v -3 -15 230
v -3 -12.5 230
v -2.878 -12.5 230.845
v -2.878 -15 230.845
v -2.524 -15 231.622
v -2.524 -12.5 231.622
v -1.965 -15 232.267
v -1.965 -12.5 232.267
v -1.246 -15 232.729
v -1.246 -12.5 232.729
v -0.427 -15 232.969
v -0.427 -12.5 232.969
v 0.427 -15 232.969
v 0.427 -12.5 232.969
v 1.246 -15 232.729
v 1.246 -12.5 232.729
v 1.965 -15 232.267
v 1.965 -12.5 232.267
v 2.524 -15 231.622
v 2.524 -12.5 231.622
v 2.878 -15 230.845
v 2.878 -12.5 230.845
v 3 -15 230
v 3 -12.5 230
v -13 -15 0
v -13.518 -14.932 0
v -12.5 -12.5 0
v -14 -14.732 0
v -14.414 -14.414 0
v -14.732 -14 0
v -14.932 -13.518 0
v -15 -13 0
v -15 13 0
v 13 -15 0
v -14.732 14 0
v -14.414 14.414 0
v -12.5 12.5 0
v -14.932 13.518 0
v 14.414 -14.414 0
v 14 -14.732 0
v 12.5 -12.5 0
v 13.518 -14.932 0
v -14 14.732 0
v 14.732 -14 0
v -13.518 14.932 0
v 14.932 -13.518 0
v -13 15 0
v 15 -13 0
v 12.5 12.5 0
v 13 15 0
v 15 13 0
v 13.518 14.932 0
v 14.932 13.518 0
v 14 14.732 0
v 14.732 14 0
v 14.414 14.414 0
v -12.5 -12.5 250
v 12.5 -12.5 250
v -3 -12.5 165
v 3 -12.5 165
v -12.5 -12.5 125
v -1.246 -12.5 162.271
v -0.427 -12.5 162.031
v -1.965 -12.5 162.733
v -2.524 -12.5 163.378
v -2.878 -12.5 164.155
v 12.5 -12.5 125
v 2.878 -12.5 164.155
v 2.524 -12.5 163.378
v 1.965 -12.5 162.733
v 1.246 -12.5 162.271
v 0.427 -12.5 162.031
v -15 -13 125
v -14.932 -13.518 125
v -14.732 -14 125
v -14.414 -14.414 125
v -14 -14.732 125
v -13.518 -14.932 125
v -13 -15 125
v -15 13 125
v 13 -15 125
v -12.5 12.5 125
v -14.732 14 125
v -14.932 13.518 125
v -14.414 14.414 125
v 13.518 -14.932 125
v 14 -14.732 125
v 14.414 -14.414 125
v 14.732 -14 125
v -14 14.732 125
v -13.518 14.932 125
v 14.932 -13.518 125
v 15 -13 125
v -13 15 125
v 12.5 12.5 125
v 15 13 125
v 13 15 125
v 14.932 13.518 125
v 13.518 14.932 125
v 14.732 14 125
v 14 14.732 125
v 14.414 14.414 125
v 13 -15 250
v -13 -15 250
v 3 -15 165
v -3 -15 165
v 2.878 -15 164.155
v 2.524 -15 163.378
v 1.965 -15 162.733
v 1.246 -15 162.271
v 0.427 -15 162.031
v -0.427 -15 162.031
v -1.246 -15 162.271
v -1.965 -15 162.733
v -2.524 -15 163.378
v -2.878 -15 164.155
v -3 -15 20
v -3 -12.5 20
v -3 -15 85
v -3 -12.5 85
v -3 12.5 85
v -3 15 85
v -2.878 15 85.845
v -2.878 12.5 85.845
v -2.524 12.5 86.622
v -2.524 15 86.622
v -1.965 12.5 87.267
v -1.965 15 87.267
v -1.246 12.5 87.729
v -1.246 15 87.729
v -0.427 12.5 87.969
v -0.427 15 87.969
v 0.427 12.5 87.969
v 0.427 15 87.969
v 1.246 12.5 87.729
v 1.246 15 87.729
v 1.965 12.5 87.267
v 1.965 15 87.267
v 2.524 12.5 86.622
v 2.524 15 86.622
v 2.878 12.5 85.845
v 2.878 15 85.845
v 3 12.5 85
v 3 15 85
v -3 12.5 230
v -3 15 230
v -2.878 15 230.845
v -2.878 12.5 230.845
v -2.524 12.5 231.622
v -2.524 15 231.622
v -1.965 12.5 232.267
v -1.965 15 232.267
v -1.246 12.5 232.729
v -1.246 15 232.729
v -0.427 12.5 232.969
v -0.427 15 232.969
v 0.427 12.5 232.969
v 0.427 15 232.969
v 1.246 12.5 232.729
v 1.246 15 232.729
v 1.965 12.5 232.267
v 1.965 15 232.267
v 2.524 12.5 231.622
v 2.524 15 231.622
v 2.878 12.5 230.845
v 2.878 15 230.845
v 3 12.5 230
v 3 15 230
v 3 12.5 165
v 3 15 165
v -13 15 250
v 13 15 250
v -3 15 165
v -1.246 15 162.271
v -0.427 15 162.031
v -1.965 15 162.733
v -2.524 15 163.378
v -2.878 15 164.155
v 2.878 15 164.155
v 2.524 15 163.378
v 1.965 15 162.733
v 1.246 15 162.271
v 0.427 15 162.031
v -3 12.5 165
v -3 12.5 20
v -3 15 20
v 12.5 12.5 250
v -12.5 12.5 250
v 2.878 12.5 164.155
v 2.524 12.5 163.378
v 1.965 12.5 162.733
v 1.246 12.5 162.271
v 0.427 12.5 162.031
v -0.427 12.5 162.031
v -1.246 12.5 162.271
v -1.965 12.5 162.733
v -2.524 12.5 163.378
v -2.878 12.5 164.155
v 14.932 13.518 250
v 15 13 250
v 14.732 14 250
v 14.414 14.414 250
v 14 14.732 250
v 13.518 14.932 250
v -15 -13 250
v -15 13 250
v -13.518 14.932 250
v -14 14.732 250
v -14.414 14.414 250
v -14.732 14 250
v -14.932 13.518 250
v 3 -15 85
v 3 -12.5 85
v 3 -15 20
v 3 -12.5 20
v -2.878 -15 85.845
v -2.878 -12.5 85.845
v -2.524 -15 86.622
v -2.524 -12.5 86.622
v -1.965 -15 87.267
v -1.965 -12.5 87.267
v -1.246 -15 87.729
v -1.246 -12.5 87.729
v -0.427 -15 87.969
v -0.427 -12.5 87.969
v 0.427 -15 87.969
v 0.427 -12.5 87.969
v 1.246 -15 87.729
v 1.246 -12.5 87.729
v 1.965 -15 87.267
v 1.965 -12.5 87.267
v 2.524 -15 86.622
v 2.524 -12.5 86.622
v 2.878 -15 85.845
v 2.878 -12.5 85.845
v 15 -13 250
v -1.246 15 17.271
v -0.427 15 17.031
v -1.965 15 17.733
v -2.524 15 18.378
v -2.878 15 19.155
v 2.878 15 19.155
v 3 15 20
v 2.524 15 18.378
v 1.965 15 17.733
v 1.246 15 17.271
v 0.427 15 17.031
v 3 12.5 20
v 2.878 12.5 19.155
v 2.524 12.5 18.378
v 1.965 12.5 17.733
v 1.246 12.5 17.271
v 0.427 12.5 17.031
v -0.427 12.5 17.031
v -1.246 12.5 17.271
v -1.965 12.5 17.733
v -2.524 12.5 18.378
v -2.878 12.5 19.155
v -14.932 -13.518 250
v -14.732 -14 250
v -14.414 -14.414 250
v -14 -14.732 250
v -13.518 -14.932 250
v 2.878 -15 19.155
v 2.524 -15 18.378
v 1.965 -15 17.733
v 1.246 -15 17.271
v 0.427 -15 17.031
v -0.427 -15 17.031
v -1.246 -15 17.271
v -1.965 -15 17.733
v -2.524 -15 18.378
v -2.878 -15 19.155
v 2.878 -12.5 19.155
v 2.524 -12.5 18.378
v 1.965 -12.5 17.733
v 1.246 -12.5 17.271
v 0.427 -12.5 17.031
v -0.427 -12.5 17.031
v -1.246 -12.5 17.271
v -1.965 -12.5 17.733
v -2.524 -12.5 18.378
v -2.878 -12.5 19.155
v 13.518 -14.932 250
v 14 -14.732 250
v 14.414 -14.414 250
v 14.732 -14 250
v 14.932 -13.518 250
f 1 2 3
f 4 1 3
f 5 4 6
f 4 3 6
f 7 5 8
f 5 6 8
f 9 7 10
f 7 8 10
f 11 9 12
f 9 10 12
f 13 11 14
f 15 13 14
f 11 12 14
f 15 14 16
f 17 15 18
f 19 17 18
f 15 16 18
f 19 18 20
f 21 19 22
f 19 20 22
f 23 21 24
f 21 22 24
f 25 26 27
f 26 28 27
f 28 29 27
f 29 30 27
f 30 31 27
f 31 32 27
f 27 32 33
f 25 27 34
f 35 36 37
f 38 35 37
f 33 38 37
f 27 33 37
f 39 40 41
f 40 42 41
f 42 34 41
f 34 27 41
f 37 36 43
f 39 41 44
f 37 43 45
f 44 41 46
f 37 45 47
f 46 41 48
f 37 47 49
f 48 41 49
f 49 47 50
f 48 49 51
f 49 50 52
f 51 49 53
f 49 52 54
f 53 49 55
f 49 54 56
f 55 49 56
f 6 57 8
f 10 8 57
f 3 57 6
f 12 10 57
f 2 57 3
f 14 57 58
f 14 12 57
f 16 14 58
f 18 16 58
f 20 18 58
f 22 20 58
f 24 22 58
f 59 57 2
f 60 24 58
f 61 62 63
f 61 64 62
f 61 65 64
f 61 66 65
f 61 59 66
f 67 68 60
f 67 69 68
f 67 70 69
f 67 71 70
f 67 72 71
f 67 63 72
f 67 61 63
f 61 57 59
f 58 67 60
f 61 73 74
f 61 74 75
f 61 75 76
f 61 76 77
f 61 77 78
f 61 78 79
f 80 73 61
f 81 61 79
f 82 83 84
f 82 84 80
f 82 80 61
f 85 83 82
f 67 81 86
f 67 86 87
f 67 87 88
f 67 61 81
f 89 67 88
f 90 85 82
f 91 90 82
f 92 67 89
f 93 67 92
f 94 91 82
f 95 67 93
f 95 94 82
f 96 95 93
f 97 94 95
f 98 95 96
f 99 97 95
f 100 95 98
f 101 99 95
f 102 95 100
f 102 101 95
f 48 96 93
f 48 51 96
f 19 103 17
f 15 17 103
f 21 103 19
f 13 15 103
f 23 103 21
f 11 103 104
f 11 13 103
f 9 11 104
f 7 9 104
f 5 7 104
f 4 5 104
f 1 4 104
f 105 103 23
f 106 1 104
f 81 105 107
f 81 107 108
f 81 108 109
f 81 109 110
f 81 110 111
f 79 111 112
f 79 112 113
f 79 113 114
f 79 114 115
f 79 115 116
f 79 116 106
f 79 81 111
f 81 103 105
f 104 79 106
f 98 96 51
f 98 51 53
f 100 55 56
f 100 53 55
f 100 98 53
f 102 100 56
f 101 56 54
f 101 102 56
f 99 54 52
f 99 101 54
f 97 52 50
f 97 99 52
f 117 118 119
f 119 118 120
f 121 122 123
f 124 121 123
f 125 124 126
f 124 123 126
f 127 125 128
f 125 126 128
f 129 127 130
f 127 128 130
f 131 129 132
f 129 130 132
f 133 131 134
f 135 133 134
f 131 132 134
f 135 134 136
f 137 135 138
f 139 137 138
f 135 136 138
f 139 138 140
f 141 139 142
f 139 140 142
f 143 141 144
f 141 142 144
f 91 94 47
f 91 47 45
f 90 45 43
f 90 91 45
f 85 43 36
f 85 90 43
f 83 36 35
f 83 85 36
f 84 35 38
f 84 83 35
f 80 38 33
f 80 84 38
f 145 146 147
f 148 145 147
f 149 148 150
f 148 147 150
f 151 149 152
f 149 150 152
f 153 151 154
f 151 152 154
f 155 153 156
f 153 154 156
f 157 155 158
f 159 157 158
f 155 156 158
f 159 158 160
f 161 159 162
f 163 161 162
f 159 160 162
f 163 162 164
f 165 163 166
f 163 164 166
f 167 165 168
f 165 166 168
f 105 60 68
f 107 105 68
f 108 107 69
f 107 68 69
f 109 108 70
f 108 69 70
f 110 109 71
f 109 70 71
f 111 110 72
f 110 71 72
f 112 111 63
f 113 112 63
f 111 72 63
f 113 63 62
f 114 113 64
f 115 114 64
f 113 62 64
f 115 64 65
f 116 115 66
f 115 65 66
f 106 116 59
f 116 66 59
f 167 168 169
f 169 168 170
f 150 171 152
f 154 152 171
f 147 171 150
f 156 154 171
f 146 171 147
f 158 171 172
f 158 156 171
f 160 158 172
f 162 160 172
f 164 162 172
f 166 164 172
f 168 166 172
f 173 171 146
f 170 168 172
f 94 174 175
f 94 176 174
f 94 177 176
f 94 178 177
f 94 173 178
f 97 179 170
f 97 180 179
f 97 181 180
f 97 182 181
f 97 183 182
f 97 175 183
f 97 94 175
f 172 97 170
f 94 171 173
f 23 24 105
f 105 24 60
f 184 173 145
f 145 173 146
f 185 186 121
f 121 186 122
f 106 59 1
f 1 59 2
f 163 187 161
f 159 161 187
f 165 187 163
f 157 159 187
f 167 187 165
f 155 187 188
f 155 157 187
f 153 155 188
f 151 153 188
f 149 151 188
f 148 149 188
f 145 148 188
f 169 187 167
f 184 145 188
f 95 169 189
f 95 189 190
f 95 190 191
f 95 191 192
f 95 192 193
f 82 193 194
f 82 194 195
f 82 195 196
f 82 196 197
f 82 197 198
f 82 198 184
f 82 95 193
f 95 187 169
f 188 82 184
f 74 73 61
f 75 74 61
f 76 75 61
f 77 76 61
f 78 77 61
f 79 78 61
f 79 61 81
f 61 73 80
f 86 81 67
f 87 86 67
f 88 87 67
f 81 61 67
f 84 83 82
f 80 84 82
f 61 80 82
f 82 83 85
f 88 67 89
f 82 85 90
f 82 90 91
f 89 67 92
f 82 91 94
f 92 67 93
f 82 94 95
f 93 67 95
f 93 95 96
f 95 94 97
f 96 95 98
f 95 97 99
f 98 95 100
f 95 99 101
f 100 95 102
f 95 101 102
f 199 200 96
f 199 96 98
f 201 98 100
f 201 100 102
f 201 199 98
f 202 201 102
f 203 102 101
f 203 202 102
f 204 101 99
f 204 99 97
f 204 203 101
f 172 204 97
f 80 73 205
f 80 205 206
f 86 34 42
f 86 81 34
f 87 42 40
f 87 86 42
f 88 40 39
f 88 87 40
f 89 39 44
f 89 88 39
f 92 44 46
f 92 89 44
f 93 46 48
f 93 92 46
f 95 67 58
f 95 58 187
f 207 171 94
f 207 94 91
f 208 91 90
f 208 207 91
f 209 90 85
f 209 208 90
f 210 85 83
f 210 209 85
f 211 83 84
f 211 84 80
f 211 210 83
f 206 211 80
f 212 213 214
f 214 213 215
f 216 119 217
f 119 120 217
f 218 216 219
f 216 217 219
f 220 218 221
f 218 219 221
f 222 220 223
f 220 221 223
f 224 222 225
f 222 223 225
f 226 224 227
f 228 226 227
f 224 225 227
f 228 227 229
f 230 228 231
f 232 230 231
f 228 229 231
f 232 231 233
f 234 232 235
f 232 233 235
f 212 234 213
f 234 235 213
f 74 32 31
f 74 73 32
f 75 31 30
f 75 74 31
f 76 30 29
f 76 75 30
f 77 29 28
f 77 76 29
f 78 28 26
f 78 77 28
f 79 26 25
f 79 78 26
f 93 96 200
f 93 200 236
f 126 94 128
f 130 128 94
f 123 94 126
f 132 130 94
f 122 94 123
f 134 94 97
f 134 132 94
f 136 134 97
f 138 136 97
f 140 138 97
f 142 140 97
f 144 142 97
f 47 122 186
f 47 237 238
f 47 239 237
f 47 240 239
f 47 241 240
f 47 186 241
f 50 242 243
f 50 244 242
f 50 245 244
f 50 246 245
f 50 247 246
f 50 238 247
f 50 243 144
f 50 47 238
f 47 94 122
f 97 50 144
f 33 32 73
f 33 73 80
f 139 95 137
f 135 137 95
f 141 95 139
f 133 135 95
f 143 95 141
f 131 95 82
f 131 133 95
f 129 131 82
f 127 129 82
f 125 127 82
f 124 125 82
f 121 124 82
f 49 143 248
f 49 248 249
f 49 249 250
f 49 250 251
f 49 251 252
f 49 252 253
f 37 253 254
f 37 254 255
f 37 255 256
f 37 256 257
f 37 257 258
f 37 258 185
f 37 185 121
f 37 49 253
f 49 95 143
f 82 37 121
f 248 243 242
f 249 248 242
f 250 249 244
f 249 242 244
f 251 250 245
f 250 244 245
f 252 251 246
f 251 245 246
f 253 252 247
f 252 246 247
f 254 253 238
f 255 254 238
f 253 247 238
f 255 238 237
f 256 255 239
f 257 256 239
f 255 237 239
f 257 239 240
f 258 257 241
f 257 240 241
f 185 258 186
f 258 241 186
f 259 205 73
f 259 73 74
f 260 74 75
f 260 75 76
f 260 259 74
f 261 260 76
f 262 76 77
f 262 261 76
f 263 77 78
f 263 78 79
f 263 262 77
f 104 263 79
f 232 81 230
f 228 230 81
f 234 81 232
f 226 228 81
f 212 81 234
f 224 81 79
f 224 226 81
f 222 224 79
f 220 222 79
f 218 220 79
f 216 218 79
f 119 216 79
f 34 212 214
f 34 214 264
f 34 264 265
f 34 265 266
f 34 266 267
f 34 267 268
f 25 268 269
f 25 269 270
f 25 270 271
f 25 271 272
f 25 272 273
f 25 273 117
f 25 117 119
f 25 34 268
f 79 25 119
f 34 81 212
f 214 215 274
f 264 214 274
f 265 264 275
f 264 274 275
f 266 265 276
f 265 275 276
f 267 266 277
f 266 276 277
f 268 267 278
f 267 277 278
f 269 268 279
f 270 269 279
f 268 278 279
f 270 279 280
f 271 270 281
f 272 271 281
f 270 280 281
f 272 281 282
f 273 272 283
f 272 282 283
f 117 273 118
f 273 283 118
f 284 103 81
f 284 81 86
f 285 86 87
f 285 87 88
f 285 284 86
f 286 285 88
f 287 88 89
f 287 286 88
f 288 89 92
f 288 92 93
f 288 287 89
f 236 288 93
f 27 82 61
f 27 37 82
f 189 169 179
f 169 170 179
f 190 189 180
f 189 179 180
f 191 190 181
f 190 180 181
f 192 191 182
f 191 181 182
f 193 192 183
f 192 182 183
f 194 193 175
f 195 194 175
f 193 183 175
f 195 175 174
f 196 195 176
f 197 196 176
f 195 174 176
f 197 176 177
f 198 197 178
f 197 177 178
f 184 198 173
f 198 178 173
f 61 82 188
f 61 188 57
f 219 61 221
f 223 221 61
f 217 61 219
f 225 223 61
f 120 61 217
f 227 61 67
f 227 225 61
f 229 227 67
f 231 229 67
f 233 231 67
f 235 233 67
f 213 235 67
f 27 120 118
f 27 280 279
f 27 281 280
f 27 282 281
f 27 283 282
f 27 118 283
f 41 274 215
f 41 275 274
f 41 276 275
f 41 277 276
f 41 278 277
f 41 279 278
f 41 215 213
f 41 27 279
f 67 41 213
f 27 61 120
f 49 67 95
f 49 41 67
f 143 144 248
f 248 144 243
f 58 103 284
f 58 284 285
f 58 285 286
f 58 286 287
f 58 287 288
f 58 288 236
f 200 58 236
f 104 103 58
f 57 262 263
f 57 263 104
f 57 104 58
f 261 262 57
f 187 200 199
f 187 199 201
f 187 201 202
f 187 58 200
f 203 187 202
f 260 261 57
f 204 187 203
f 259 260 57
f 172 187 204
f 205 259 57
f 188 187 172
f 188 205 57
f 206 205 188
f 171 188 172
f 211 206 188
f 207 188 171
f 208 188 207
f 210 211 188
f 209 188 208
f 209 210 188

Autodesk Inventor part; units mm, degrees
ref_plane "YZ Plane" through (0, 0, 0) normal (1, 0, 0) x (0, 1, 0)
sketch "Sketch1" plane through (0, 0, 0) normal (0, 0, 1) x (1, 0, 0)
  line L0 (-15, 15) -> (15, 15)
  line L1 (15, 15) -> (15, -15)
  line L2 (15, -15) -> (-15, -15)
  line L3 (-15, -15) -> (-15, 15)
  line L4 (12.5, 12.5) -> (-12.5, 12.5)
  line L5 (-12.5, 12.5) -> (-12.5, -12.5)
  line L6 (-12.5, -12.5) -> (12.5, -12.5)
  line L7 (12.5, -12.5) -> (12.5, 12.5)
  point P0 (0, 0)
  dimension "d0" = 30
  dimension "d1" = 30
  dimension "d2" = 15
  dimension "d3" = 15
  dimension "d4" = 2.5
extrude "Extrusion1" add sketch "Sketch1" along normal blind 1000
fillet "Fillet1" radius 2 4 edges at (15, 15, 500) (-15, 15, 500) (-15, -15, 500) (15, -15, 500)
ref_plane "Work Plane1" through (0, 0, 250) normal (0, 0, -1) x (-1, 0, 0)
split "Split1" plane through (0, 0, 250) removes the side toward (0, 0, 1)
ref_plane "midPlane" through (-13, -15, 125) normal (0, 0, 1) x (1, 0, 0)
sketch "Sketch3" plane through (-13, 15, 0) normal (0, 1, 0) x (1, 0, 0)
  line L0 (13, -230) -> (13, -165) construction
  line L1 (16, -230) -> (16, -165)
  line L2 (10, -165) -> (10, -230)
  arc A0 (10, -230) -> (16, -230) centre (13, -230) ccw
  arc A1 (16, -165) -> (10, -165) centre (13, -165) ccw
  line L3 (13, -85) -> (13, -20) construction
  line L4 (16, -85) -> (16, -20)
  line L5 (10, -20) -> (10, -85)
  arc A2 (10, -85) -> (16, -85) centre (13, -85) ccw
  arc A3 (16, -20) -> (10, -20) centre (13, -20) ccw
  line L6 (28, -250) -> (28, 0) projected
  line L7 (-2, 0) -> (-2, -250) projected
  line L8 (0, -250) -> (26, -250) projected
  point P0 (13, 0)
  point P1 (13, -197.5)
  point P2 (13, -52.5)
  dimension "d28" = 6
  dimension "d29" = 6
  dimension "d30" = 30
  dimension "d31" = 15
  dimension "d32" = 15
  dimension "d33" = 65
  dimension "d34" = 65
  dimension "d35" = 20
  dimension "d36" = 20
extrude "Extrusion2" cut sketch "Sketch3" against normal through all
split body "Split3" result two bodies by plane through (-13, -15, 125) normal (0, 0, 1) first body at (-14.5, 4.3333, 166.6667)
equation "\"d0\" = sm_varx_squareBarDimension"
equation "\"d1\" = d0"
equation "\"d2\" = 0.5 * d1"
equation "\"d3\" = 0.5 * d0"
equation "\"d4\" = sm_varx_squareBarThickness"
equation "\"d31\" = 0.5 * d30"
equation "\"d32\" = d31"
equation "\"d34\" = d33"
equation "\"d36\" = d35"
equation "\"hoop_angle_z\" = 45deg"
equation "\"hoop_bearing_length\" = 5deg"
equation "\"hoop_cable_diam\" = 5"
equation "\"hoop_cable_pulley_diam\" = 22"
equation "\"hoop_thickness_large\" = 4"
equation "\"hoop_thickness_medium\" = 3.2"
equation "\"hoop_thickness_small\" = 2"
equation "\"hoop_width_large\" = 51"
equation "\"hoop_width_medium\" = 33.7"
equation "\"hoop_width_small\" = 25.4"
equation "\"rack_tooth_addendum\" = 5"
equation "\"rack_tooth_dedendum\" = 5"
equation "\"rack_tooth_thickness\" = 5"
equation "\"secure_arm_angle\" = 35deg"
equation "\"secure_arm_radii\" = 9"
equation "\"support_baseClamp_platformLengthBuffer\" = 35"
equation "\"support_baseClamp_platformThickness\" = 15"
equation "\"support_baseClamp_platformWidthBuffer\" = 0"
equation "\"support_baseClamp_sleeveHoleDiameter\" = 12"
equation "\"support_baseClamp_sleeveSweepTerminationAngle\" = 55deg"
equation "\"support_baseClamp_thickness\" = 8"
equation "\"support_frame_endHoleBuffer\" = 45"
equation "\"support_frame_squareBarFillet\" = 2"
equation "\"support_frame_squareBarThickness\" = 5"
equation "\"hoop_tabs_thickness\" = 6"
equation "\"hoop_tabs_hole\" = 12"
equation "\"wheelchair_deployed_width\" = 635"
equation "\"wheelchair_deployed_length\" = 1067"
equation "\"wheelchair_deployed_height\" = 914"
equation "\"sm_varx_squareBarDimension\" = 30"
equation "\"sm_varx_squareBarThickness\" = 2.5"
equation "\"sm_varx_member_tolerance\" = 0"
equation "\"sm_varx_pinPlate_thickness\" = 5"
equation "\"sm_varx_pinPlate_holeDiameter\" = 5"
equation "\"hoop_bushing12_radialInterference\" = 0"
equation "\"hoop_bushing23_radialInterference\" = 0"
equation "\"hoop_bushing23_od\" = -2 * hoop_thickness_medium + hoop_width_medium + hoop_bushing23_radialInterference"
equation "\"hoop_bushing23_thickness\" = -hoop_width_small + hoop_bushing23_od - 2 * hoop_bushing23_radialInterference"
equation "\"hoop_bushing12_od\" = -2 * hoop_thickness_large + hoop_width_large + hoop_bushing12_radialInterference"
equation "\"wheelchatir_pos_deploy_angle_0\" = 65deg"
equation "\"wheelchatir_pos_store_angle_0\" = 90deg"
equation "\"wheelchatir_pos_deploy_angle_1\" = 20deg"
equation "\"wheelchatir_pos_store_angle_1\" = 20deg"
equation "\"hoop_bushing12_thickness\" = -hoop_width_medium + hoop_bushing12_od - 2 * hoop_bushing12_radialInterference"
properties part number "member_vertical" material "Steel, Galvanized"
